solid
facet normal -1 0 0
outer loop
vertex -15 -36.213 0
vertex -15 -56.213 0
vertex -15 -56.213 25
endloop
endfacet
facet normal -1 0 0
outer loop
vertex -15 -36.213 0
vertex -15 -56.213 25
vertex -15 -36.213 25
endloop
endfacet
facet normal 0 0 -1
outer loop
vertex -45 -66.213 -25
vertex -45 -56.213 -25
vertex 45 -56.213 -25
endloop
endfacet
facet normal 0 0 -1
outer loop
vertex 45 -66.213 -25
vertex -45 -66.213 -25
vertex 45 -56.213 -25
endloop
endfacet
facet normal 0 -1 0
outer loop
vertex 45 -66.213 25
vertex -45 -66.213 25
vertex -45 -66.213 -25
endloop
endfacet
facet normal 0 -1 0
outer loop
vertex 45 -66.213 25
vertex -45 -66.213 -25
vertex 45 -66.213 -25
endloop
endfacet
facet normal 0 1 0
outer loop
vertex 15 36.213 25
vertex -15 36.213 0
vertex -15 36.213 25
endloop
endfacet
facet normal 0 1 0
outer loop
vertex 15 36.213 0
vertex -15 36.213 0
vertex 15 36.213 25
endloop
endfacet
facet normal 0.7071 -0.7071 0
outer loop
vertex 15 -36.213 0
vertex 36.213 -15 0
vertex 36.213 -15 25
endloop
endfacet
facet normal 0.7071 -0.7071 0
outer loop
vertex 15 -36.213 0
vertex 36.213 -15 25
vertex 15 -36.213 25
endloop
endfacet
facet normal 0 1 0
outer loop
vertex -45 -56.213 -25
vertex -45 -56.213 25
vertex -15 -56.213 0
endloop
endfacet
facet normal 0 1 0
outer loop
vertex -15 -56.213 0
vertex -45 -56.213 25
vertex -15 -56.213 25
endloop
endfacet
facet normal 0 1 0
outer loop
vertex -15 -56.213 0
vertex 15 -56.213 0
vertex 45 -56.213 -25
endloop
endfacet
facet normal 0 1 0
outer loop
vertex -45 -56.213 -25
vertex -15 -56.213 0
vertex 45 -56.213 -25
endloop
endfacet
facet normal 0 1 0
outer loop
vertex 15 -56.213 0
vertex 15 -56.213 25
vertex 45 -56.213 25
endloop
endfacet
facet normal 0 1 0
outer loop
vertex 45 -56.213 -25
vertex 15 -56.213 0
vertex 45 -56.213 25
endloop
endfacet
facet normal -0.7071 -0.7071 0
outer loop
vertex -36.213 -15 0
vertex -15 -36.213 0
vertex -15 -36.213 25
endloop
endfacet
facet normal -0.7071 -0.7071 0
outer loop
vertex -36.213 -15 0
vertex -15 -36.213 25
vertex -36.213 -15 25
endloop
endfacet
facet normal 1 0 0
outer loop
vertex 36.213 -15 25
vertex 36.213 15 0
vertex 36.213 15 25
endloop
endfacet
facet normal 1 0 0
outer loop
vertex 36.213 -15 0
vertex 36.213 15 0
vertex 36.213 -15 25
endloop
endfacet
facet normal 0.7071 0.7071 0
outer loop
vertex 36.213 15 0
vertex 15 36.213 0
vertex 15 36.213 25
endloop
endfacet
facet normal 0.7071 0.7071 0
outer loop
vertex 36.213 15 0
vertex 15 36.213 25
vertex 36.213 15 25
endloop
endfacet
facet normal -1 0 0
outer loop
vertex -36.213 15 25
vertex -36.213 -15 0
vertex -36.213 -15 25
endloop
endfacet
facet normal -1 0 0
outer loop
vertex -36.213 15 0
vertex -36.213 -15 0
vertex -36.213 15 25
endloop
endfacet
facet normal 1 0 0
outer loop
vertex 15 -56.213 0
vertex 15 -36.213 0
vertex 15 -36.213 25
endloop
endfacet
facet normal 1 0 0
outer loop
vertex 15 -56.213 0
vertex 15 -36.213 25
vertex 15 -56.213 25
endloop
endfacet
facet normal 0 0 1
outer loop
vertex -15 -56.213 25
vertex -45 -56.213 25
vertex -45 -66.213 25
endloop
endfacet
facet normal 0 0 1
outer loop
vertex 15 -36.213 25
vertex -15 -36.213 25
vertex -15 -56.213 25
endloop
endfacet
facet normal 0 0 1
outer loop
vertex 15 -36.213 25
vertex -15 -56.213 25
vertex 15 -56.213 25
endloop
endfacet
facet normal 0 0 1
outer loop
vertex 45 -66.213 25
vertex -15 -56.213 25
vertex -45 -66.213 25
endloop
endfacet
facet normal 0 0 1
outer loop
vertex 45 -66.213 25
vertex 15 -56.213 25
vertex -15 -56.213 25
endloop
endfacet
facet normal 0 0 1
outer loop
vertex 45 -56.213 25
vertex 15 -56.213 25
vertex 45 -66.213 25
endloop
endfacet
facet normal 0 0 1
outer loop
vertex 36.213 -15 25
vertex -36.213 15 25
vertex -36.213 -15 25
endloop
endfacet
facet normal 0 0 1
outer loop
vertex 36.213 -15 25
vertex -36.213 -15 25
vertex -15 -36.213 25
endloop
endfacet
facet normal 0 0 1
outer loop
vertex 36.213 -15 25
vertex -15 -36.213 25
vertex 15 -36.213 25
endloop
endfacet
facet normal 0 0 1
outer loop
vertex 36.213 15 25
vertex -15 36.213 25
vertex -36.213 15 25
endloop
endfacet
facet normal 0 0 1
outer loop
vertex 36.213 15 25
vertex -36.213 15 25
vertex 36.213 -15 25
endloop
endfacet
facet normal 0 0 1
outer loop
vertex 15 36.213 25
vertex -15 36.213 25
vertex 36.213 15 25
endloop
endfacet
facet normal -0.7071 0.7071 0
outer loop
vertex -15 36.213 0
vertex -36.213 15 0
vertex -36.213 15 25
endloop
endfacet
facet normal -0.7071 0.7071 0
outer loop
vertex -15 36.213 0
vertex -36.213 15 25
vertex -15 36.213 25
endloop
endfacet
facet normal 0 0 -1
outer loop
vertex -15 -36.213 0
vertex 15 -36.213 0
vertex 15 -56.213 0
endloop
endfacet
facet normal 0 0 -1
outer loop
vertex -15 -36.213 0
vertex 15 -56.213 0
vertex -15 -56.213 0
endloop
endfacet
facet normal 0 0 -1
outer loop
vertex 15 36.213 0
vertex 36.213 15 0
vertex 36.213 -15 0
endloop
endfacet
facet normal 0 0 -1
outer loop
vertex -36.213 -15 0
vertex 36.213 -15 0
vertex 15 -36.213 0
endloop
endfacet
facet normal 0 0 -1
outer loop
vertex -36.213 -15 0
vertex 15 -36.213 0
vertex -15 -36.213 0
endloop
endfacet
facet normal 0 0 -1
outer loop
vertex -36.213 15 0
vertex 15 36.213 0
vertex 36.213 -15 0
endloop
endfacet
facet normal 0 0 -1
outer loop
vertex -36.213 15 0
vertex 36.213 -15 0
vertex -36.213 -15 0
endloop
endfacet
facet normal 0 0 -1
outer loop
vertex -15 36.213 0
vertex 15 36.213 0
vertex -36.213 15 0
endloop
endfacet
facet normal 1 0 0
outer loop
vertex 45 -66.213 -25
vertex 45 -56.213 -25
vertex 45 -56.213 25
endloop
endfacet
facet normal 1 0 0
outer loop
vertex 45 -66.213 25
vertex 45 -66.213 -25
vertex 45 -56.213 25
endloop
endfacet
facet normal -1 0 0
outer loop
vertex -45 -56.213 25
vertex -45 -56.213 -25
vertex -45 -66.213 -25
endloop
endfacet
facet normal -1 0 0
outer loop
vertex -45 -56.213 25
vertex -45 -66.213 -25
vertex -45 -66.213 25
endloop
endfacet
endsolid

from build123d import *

# Parameters (mm, degrees)
EXTRUDE1_DEPTH = 25
SKETCH3_W      = 90
SKETCH3_H      = 50
EXTRUDE2_DEPTH = 10


with BuildPart() as part:
    # Sketch2 → Extrude1 (new body)
    with BuildSketch(Plane.XY):
        Polygon((15, -36.213203436), (15, -56.213203436), (-15, -56.213203436), (-15, -36.213203436), (-36.213203436, -15), (-36.213203436, 15), (-15, 36.213203436), (15, 36.213203436), (36.213203436, 15), (36.213203436, -15), align=None)
    extrude(amount=EXTRUDE1_DEPTH)

    # Sketch3 → Extrude2 (add)
    with BuildSketch(Plane.XZ.offset(56.213203436)):
        Rectangle(SKETCH3_W, SKETCH3_H)
    extrude(amount=EXTRUDE2_DEPTH)


solid = part.part
